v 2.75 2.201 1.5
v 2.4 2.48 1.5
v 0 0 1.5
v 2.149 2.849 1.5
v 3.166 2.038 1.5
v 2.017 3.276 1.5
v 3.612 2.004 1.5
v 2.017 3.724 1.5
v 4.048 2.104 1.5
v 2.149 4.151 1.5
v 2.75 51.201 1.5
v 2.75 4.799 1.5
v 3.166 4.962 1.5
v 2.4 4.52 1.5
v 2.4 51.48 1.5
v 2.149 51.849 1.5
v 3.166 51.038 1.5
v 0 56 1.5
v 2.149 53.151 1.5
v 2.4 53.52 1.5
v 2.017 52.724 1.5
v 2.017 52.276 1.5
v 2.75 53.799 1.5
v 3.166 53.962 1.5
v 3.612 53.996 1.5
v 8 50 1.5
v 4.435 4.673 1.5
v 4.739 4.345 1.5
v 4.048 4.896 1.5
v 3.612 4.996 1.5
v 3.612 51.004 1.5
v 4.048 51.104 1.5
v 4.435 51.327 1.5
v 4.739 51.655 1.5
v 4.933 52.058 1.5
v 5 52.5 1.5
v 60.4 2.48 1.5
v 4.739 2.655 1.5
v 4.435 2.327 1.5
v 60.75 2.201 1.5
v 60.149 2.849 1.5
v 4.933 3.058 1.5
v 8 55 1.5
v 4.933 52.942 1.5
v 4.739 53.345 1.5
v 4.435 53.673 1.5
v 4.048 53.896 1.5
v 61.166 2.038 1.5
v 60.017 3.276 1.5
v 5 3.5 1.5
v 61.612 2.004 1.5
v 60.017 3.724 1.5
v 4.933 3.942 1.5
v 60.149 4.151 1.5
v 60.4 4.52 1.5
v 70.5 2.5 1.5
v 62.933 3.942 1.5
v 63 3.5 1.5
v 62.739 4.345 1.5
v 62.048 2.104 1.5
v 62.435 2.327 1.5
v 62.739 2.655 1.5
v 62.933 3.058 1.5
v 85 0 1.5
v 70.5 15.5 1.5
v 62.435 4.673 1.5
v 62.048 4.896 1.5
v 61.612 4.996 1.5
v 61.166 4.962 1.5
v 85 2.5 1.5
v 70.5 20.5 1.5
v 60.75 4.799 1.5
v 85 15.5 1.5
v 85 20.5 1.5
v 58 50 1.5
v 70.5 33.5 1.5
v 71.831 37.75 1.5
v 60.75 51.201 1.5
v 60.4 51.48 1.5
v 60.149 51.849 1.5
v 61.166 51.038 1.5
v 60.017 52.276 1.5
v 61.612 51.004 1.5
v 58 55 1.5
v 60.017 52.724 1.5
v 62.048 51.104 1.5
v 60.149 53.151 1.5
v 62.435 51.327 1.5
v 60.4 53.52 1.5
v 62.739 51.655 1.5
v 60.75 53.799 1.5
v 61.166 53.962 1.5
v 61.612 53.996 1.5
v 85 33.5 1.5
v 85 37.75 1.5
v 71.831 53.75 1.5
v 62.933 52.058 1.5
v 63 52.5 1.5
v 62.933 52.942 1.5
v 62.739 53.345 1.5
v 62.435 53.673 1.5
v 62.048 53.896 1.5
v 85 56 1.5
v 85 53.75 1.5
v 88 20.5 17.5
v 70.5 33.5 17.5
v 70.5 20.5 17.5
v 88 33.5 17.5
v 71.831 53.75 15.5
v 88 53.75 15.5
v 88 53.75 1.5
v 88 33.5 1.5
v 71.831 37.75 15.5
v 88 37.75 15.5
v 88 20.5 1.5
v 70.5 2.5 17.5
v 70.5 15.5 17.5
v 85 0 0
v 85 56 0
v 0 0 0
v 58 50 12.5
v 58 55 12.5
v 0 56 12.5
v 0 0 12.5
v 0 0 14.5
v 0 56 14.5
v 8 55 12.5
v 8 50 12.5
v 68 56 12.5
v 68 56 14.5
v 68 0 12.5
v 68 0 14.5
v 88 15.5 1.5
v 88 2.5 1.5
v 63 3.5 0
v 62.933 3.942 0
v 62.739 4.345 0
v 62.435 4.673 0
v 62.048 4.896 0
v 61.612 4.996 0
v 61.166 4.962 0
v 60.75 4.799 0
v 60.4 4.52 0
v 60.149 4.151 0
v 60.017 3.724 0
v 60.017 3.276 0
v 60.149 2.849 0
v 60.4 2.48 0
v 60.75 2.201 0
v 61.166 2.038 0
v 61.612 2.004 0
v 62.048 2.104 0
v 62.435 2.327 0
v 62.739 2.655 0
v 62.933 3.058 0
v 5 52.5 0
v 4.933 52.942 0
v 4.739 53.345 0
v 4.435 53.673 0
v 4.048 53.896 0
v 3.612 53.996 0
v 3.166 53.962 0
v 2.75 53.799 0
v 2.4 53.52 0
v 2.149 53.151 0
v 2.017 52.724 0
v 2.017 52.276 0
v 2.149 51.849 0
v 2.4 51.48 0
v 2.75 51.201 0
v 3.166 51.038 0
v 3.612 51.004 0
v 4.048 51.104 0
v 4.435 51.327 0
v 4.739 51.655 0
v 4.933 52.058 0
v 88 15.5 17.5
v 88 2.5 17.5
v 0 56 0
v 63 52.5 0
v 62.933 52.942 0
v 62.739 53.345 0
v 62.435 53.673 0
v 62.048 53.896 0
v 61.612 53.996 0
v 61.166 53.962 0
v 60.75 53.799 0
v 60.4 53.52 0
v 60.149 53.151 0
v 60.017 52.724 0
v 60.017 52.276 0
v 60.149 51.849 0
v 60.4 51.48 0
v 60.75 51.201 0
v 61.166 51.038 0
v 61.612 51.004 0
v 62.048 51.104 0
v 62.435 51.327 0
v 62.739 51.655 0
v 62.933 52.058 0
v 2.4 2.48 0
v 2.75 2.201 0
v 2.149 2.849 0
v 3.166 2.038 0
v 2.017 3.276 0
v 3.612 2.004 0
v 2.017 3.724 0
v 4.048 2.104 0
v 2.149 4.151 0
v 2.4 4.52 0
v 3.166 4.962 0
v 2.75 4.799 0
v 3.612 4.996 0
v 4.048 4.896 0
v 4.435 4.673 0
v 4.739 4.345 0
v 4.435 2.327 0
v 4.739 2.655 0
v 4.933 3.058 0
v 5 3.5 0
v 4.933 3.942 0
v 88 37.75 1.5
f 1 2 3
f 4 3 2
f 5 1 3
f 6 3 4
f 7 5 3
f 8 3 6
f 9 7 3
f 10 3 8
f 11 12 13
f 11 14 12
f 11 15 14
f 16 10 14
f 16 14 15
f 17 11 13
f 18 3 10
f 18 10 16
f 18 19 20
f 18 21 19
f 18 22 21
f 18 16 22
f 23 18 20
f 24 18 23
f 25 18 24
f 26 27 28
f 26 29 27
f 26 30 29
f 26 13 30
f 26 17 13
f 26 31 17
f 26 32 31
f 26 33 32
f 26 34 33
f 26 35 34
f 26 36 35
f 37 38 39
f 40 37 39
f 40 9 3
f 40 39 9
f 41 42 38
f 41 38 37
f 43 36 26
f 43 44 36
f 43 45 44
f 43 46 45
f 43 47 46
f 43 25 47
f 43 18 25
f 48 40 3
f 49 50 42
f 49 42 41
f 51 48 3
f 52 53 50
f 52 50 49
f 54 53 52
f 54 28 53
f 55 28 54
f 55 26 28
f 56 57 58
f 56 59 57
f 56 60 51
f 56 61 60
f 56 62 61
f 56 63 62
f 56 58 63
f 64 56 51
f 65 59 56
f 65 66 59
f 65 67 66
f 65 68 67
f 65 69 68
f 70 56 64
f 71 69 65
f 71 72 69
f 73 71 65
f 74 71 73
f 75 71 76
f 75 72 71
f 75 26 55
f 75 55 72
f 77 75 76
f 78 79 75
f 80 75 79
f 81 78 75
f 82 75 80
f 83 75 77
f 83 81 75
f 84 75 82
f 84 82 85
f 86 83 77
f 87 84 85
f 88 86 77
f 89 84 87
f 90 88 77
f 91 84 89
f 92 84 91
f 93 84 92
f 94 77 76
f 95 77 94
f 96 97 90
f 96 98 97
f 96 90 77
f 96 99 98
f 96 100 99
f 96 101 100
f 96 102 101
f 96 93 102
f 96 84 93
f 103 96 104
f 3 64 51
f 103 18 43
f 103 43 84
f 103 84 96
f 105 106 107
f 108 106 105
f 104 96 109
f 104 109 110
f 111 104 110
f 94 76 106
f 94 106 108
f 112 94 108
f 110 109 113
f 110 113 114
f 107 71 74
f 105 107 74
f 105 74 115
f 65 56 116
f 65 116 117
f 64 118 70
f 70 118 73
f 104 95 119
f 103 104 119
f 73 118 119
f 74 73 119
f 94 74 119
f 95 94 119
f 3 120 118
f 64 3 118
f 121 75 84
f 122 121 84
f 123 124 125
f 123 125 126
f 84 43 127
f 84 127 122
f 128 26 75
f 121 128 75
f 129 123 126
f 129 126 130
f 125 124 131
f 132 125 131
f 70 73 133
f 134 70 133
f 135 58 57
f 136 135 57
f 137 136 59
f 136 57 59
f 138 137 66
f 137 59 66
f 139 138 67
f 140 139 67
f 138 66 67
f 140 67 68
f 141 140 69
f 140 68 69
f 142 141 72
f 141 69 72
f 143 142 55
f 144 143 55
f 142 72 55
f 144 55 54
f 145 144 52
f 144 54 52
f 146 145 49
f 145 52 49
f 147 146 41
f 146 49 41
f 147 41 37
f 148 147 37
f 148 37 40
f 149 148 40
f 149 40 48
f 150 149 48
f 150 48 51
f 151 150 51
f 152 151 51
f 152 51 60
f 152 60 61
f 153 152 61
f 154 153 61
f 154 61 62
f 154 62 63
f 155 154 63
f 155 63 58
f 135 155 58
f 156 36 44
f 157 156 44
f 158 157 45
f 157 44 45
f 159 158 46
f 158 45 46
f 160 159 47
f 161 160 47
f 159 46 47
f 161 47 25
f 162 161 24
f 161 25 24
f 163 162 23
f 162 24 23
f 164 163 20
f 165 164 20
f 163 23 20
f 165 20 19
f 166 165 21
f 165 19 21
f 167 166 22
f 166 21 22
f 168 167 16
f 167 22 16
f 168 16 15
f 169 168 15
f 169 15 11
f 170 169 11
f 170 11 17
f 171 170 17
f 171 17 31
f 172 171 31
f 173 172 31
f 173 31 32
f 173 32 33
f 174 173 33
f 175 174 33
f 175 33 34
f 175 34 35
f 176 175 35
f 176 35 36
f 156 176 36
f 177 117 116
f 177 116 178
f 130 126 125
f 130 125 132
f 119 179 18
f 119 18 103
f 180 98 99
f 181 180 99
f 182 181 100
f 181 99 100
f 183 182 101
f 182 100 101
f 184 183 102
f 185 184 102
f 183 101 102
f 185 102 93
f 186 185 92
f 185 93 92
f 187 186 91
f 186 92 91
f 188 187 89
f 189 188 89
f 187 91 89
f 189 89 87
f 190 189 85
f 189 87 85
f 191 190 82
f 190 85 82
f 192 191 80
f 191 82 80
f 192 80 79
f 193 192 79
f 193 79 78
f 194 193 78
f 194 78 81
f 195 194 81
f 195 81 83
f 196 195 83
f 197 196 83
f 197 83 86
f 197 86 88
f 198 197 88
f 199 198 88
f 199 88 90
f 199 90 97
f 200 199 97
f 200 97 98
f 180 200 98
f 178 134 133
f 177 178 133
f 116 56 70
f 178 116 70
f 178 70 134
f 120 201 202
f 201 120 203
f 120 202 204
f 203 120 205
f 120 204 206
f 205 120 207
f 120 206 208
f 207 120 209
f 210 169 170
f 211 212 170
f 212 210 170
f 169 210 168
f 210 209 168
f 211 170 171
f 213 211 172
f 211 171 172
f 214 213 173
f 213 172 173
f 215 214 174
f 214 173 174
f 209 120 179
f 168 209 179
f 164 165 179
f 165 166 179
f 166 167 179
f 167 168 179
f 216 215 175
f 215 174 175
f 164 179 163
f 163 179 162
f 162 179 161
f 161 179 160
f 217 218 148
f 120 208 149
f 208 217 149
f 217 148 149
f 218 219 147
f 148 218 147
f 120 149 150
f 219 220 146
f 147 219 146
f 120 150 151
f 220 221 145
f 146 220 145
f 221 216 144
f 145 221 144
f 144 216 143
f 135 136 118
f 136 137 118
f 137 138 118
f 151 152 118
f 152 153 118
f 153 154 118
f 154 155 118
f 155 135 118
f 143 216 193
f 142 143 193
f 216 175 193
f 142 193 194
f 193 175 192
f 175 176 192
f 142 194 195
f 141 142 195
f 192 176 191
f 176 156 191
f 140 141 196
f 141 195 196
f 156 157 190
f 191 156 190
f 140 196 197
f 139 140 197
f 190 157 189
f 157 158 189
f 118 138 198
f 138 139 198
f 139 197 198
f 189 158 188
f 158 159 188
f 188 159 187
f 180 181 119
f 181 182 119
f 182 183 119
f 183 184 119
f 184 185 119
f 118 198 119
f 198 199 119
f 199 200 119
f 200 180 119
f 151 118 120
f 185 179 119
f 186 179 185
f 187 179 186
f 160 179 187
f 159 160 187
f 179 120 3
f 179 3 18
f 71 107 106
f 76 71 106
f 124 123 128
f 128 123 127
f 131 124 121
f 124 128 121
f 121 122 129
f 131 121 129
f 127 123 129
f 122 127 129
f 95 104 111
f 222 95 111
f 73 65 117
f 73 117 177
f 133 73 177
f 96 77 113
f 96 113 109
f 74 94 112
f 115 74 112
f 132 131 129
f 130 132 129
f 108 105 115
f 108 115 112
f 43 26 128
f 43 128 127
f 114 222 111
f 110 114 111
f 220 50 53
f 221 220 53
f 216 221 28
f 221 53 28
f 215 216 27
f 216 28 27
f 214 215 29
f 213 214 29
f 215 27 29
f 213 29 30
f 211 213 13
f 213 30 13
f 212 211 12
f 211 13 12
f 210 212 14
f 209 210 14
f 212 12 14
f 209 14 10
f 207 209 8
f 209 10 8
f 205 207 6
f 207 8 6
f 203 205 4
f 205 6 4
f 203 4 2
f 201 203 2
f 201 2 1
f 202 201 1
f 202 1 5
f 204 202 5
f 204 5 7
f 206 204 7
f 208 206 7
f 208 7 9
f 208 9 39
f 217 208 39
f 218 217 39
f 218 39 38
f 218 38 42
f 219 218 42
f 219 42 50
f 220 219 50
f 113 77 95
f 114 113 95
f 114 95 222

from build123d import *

# Parameters (mm, degrees)
SKETCH1_W           = 85
SKETCH1_H           = 56
BOSS_EXTRUDE1_DEPTH = 1.5
SKETCH2_R           = 1.5
CUT_EXTRUDE1_DEPTH  = 102.800049116
SKETCH3_W           = 17.5
SKETCH3_H           = 13
BOSS_EXTRUDE3_DEPTH = 16
SKETCH4_W           = 16.168614458
SKETCH4_H           = 16
BOSS_EXTRUDE4_DEPTH = 14
SKETCH5_W           = 50
SKETCH5_H           = 5
BOSS_EXTRUDE5_DEPTH = 11
SKETCH6_W           = 68
SKETCH6_H           = 56
BOSS_EXTRUDE6_DEPTH = 2


with BuildPart() as part:
    # Sketch1 → Boss-Extrude1 (new body)
    with BuildSketch(Plane.XY):
        with Locations((42.5, 28)):
            Rectangle(SKETCH1_W, SKETCH1_H)
    extrude(amount=BOSS_EXTRUDE1_DEPTH)

    # Sketch2 → Cut-Extrude1 (cut, through all)
    with BuildSketch(Plane.XY.offset(1.5)):
        with Locations((3.5, 52.5)):
            Circle(SKETCH2_R)
        with Locations((3.5, 3.5)):
            Circle(SKETCH2_R)
        with Locations((61.5, 52.5)):
            Circle(SKETCH2_R)
        with Locations((61.5, 3.5)):
            Circle(SKETCH2_R)
    extrude(amount=-CUT_EXTRUDE1_DEPTH, mode=Mode.SUBTRACT)

    # Sketch3 → Boss-Extrude3 (add)
    with BuildSketch(Plane.XY.offset(1.5)):
        with Locations((79.25, 9)):
            Rectangle(SKETCH3_W, SKETCH3_H)
        with Locations((79.25, 27)):
            Rectangle(SKETCH3_W, SKETCH3_H)
    extrude(amount=BOSS_EXTRUDE3_DEPTH)

    # Sketch4 → Boss-Extrude4 (add)
    with BuildSketch(Plane.XY.offset(1.5)):
        with Locations((79.915692771, 45.75)):
            Rectangle(SKETCH4_W, SKETCH4_H)
    extrude(amount=BOSS_EXTRUDE4_DEPTH)

    # Sketch5 → Boss-Extrude5 (add)
    with BuildSketch(Plane.XY.offset(1.5)):
        with Locations((33, 52.5)):
            Rectangle(SKETCH5_W, SKETCH5_H)
    extrude(amount=BOSS_EXTRUDE5_DEPTH)

    # Sketch6 → Boss-Extrude6 (add)
    with BuildSketch(Plane.XY.offset(12.5)):
        with Locations((34, 28)):
            Rectangle(SKETCH6_W, SKETCH6_H)
    extrude(amount=BOSS_EXTRUDE6_DEPTH)


solid = part.part
